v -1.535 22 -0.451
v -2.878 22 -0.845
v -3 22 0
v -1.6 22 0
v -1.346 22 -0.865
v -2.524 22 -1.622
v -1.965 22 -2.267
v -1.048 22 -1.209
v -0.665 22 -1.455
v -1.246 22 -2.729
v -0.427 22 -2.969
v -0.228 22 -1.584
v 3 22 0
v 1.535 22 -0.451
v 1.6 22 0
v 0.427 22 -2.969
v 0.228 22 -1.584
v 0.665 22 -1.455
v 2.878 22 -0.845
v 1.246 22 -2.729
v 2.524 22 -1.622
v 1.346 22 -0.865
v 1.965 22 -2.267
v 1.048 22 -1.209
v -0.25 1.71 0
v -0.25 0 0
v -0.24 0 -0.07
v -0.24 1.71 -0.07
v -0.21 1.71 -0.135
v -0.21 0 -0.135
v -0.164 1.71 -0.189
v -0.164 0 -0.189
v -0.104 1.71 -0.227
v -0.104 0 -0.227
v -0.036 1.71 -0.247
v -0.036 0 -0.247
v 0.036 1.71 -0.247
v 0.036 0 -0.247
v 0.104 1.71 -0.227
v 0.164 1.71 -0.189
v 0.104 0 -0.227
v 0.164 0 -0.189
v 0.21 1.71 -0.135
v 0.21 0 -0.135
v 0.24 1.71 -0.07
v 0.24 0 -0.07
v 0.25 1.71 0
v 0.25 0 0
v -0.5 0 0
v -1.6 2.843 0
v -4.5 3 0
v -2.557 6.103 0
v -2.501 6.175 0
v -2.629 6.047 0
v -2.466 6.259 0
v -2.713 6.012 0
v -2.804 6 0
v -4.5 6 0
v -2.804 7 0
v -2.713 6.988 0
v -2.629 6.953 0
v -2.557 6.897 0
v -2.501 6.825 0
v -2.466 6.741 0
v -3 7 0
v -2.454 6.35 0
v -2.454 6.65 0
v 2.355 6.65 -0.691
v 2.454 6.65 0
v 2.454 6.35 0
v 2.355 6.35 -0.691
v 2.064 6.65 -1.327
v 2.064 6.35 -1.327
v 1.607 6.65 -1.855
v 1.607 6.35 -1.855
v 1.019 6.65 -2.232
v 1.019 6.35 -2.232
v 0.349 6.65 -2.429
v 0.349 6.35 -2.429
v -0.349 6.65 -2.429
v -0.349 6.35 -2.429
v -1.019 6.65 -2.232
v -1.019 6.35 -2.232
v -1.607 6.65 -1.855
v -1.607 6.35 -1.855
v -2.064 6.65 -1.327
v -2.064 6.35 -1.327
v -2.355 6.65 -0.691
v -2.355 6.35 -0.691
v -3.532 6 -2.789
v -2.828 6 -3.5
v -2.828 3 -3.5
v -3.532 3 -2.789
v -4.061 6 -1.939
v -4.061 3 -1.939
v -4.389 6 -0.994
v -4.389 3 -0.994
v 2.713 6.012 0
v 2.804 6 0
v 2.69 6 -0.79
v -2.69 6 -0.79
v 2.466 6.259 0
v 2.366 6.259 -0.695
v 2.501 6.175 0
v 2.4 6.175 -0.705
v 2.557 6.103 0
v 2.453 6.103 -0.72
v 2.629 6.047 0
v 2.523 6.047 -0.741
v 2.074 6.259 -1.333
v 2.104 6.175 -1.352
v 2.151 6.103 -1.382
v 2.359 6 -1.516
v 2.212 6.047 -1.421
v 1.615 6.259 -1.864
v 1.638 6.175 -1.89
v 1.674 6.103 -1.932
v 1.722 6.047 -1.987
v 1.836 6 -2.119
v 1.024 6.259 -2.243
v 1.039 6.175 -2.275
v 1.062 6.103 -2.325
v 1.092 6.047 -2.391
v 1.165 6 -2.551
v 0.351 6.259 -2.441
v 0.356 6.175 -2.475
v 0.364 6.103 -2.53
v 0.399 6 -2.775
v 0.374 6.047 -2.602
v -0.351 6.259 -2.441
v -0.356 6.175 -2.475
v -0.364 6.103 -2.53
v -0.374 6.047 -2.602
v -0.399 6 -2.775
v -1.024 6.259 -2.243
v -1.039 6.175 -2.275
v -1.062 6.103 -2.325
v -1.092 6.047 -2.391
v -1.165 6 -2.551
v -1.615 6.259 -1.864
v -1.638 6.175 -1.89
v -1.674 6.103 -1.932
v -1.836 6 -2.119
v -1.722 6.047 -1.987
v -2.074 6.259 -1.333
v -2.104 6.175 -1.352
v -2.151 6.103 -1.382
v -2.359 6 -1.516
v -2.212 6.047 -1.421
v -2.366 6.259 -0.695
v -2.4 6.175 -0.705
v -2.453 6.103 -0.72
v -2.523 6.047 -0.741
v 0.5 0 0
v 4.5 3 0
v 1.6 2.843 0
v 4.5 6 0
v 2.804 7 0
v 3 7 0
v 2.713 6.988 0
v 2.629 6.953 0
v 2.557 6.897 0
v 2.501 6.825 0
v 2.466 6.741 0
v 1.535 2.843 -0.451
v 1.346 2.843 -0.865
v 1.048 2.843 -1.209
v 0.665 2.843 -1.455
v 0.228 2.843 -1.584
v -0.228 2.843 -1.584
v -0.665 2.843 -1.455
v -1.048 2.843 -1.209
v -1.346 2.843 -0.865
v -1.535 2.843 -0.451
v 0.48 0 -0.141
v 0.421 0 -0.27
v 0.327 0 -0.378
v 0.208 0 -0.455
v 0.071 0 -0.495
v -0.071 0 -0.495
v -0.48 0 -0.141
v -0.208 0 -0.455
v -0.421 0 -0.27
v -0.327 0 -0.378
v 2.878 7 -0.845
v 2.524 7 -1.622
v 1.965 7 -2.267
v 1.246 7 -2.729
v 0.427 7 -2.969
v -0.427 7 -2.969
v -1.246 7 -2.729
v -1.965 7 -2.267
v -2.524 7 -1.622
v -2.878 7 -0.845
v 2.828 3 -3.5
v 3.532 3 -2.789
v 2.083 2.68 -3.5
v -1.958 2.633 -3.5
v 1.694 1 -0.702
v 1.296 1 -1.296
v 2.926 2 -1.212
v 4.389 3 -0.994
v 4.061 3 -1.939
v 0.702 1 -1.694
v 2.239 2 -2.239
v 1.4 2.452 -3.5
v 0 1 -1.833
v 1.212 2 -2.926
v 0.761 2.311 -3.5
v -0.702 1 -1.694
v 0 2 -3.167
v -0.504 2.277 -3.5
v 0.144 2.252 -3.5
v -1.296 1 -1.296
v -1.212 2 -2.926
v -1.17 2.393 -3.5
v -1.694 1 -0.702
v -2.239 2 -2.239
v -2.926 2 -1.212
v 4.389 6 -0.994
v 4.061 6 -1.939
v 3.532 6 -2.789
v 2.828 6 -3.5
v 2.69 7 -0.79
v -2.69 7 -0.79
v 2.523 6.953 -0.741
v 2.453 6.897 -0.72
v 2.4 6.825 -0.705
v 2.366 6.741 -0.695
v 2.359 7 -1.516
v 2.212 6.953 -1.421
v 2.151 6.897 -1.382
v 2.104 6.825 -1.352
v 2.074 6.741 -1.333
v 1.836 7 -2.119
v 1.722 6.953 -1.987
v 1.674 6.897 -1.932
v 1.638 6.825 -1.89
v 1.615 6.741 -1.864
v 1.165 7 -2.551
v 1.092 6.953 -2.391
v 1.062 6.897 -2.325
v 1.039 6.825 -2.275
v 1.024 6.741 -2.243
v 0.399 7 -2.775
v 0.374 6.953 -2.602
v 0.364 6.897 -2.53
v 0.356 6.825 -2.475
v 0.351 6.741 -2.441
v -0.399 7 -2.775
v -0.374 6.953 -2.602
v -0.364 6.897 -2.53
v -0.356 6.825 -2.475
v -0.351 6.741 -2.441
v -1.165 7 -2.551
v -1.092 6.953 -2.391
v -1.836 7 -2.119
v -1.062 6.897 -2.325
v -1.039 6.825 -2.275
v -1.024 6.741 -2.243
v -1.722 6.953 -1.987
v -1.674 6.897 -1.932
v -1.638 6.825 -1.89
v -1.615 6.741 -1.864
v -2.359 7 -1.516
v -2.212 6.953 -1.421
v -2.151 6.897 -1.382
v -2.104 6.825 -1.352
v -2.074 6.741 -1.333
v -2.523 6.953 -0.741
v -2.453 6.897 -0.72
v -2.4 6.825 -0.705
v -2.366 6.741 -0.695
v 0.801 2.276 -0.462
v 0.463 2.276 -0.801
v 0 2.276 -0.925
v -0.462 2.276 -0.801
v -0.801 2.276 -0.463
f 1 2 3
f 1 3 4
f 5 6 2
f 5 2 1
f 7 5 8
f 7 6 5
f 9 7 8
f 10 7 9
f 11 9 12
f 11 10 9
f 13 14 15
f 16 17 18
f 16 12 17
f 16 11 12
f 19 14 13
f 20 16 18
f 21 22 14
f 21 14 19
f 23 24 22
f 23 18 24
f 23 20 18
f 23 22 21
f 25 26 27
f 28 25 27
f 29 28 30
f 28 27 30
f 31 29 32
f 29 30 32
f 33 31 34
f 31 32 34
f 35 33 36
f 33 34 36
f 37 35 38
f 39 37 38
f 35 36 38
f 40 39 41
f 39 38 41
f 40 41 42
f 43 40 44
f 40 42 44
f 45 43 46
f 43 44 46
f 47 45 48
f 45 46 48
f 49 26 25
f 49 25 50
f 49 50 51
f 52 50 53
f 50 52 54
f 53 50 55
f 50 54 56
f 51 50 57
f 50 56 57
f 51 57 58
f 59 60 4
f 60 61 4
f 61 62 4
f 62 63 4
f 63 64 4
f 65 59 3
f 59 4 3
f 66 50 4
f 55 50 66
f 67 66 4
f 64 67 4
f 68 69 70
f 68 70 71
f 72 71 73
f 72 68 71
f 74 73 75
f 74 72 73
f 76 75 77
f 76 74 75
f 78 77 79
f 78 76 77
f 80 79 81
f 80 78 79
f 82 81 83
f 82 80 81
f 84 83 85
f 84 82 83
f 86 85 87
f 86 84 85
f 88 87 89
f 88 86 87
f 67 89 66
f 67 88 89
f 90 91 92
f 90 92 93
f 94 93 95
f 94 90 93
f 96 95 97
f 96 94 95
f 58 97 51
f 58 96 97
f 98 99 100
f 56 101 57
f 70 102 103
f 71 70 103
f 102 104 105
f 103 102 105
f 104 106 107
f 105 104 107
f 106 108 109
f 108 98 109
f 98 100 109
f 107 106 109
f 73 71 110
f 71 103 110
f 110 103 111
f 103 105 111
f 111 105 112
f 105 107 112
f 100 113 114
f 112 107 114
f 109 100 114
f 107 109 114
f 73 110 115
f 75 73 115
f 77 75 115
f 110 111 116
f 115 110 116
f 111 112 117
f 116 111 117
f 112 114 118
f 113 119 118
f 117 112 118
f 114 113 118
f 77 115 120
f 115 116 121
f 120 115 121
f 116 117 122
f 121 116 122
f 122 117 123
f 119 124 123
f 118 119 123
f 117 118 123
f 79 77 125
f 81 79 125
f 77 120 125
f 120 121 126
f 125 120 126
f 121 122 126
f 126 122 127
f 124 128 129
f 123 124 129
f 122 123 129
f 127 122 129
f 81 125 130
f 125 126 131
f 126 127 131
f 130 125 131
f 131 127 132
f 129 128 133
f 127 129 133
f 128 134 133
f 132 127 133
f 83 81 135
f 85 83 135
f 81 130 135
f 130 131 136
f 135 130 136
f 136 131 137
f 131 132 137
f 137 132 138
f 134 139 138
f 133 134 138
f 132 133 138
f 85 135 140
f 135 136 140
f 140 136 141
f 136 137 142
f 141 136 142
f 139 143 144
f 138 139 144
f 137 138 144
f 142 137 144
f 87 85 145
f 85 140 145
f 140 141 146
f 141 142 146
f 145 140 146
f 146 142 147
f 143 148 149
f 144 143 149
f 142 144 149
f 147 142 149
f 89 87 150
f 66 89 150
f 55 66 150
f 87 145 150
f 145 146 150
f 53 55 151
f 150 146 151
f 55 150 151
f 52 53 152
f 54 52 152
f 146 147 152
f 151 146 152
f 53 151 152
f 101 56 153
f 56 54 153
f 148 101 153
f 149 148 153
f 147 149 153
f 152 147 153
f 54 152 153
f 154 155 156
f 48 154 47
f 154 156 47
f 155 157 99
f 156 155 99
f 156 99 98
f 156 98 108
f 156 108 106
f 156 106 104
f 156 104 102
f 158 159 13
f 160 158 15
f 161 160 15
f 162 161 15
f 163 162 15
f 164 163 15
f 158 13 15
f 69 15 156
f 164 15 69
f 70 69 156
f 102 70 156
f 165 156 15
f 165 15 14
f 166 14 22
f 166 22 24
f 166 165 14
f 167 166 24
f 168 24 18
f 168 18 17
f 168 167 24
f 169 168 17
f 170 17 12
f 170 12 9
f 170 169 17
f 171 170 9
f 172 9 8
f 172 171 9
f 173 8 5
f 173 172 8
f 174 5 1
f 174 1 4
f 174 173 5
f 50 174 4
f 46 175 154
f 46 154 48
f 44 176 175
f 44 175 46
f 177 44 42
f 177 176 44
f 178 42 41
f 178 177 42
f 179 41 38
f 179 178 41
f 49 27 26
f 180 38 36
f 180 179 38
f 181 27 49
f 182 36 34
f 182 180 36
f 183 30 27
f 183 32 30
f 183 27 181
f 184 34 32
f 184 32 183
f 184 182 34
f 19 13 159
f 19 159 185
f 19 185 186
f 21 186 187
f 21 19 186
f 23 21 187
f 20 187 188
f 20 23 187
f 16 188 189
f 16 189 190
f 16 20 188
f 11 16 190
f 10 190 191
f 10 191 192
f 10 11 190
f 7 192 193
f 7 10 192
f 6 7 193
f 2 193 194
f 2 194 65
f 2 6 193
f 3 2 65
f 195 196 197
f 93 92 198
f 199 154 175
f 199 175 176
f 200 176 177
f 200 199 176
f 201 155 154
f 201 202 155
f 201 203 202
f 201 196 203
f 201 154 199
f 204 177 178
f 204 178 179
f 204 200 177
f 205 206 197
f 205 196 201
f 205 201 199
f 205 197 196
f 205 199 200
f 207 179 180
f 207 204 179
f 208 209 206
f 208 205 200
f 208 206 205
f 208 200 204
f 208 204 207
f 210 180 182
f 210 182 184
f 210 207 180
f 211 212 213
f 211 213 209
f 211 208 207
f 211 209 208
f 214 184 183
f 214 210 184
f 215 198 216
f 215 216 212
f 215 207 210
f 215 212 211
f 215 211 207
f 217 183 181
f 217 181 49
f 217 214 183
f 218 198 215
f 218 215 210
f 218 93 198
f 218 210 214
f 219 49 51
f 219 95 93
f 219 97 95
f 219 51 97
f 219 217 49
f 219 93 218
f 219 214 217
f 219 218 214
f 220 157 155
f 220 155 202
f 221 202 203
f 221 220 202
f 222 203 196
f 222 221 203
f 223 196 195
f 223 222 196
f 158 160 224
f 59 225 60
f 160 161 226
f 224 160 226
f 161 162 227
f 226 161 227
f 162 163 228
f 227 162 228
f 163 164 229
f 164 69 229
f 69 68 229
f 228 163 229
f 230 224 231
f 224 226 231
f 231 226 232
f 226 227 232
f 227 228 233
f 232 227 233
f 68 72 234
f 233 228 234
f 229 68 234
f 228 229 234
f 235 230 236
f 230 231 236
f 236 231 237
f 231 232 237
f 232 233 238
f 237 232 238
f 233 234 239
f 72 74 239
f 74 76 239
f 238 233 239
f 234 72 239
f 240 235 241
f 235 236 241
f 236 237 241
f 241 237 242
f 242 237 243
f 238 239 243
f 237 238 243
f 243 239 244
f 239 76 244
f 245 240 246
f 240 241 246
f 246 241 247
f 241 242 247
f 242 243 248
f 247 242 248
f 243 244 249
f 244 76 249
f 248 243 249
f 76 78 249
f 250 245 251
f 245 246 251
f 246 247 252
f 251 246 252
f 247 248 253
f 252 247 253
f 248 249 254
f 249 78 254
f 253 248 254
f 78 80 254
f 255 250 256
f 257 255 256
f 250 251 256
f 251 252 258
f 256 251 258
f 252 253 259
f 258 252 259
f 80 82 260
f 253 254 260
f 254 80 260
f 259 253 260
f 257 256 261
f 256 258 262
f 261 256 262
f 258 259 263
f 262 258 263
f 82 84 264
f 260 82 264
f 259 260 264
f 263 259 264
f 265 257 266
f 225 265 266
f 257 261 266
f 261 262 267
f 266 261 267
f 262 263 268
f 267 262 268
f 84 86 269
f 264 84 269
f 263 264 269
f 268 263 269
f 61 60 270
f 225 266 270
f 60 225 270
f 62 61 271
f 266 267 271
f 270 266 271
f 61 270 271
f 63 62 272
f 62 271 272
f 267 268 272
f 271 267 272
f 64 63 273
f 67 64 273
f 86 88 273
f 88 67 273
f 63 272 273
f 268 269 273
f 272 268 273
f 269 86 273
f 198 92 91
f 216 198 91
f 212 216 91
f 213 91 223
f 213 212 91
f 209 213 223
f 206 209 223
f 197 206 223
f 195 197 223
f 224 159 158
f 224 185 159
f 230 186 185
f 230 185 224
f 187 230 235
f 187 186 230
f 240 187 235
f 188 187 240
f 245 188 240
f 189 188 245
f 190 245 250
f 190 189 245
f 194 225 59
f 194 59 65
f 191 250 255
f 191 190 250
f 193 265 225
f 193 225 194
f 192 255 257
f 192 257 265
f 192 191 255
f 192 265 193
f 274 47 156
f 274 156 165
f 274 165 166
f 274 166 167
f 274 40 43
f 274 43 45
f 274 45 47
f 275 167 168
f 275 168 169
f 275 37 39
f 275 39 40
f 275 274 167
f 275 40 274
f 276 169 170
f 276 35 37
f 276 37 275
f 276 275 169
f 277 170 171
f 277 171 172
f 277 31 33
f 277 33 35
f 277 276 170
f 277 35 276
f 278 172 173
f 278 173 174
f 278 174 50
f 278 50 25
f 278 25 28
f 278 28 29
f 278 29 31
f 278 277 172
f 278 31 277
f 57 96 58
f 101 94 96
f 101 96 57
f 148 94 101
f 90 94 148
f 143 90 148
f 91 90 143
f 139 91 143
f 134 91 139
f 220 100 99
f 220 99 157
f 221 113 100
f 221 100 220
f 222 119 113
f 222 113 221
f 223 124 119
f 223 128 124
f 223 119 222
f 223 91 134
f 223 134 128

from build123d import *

# Parameters (mm, degrees)
SKETCH001_R     = 0.25
POCKET_DEPTH    = 5
SKETCH002_W     = 10
SKETCH002_H     = 2.096101
SKETCH002_H_2   = 2.304512
POCKET001_DEPTH = 22.001
FILLET_R        = 0.35
SKETCH003_W     = 20
SKETCH003_H     = 10
POCKET002_DEPTH = 22.001


with BuildPart() as part:
    # Sketch → Revolution (revolve)
    with BuildSketch(Plane.XY):
        Polygon((0, 0), (0.5, 0), (4.5, 3), (4.5, 6), (3, 6), (2.454, 6), (2.454, 7), (3, 7), (3, 22), (1.6, 22), (1.6, 2.842559), (0, 1.5), align=None)
    revolve(axis=Axis((0, 0, 0), (0, 1, 0)))

    # Sketch001 → Pocket (cut)
    with BuildSketch(Plane.XZ):
        Circle(SKETCH001_R)
    extrude(amount=-POCKET_DEPTH, mode=Mode.SUBTRACT)

    # Sketch002 → Pocket001 (cut, through all)
    with BuildSketch(Plane.XZ):
        with Locations((-0.418938, 4.548051)):
            Rectangle(SKETCH002_W, SKETCH002_H)
        with Locations((-0.456429, -4.652256)):
            Rectangle(SKETCH002_W, SKETCH002_H_2)
    extrude(amount=-POCKET001_DEPTH, mode=Mode.SUBTRACT)

    # Fillet
    fillet_edges = [part.edges().sort_by_distance(p)[0] for p in [
        (-2.454, 7, 0),
        (-2.454, 6, 0),
    ]]
    fillet(fillet_edges, radius=FILLET_R)

    # Sketch003 → Pocket002 (cut, through all)
    with BuildSketch(Plane(origin=(0, 22, 0), x_dir=(-1, 0, 0), z_dir=(0, 1, 0))):
        with Locations((0, 5)):
            Rectangle(SKETCH003_W, SKETCH003_H)
    extrude(amount=-POCKET002_DEPTH, mode=Mode.SUBTRACT)


solid = part.part
